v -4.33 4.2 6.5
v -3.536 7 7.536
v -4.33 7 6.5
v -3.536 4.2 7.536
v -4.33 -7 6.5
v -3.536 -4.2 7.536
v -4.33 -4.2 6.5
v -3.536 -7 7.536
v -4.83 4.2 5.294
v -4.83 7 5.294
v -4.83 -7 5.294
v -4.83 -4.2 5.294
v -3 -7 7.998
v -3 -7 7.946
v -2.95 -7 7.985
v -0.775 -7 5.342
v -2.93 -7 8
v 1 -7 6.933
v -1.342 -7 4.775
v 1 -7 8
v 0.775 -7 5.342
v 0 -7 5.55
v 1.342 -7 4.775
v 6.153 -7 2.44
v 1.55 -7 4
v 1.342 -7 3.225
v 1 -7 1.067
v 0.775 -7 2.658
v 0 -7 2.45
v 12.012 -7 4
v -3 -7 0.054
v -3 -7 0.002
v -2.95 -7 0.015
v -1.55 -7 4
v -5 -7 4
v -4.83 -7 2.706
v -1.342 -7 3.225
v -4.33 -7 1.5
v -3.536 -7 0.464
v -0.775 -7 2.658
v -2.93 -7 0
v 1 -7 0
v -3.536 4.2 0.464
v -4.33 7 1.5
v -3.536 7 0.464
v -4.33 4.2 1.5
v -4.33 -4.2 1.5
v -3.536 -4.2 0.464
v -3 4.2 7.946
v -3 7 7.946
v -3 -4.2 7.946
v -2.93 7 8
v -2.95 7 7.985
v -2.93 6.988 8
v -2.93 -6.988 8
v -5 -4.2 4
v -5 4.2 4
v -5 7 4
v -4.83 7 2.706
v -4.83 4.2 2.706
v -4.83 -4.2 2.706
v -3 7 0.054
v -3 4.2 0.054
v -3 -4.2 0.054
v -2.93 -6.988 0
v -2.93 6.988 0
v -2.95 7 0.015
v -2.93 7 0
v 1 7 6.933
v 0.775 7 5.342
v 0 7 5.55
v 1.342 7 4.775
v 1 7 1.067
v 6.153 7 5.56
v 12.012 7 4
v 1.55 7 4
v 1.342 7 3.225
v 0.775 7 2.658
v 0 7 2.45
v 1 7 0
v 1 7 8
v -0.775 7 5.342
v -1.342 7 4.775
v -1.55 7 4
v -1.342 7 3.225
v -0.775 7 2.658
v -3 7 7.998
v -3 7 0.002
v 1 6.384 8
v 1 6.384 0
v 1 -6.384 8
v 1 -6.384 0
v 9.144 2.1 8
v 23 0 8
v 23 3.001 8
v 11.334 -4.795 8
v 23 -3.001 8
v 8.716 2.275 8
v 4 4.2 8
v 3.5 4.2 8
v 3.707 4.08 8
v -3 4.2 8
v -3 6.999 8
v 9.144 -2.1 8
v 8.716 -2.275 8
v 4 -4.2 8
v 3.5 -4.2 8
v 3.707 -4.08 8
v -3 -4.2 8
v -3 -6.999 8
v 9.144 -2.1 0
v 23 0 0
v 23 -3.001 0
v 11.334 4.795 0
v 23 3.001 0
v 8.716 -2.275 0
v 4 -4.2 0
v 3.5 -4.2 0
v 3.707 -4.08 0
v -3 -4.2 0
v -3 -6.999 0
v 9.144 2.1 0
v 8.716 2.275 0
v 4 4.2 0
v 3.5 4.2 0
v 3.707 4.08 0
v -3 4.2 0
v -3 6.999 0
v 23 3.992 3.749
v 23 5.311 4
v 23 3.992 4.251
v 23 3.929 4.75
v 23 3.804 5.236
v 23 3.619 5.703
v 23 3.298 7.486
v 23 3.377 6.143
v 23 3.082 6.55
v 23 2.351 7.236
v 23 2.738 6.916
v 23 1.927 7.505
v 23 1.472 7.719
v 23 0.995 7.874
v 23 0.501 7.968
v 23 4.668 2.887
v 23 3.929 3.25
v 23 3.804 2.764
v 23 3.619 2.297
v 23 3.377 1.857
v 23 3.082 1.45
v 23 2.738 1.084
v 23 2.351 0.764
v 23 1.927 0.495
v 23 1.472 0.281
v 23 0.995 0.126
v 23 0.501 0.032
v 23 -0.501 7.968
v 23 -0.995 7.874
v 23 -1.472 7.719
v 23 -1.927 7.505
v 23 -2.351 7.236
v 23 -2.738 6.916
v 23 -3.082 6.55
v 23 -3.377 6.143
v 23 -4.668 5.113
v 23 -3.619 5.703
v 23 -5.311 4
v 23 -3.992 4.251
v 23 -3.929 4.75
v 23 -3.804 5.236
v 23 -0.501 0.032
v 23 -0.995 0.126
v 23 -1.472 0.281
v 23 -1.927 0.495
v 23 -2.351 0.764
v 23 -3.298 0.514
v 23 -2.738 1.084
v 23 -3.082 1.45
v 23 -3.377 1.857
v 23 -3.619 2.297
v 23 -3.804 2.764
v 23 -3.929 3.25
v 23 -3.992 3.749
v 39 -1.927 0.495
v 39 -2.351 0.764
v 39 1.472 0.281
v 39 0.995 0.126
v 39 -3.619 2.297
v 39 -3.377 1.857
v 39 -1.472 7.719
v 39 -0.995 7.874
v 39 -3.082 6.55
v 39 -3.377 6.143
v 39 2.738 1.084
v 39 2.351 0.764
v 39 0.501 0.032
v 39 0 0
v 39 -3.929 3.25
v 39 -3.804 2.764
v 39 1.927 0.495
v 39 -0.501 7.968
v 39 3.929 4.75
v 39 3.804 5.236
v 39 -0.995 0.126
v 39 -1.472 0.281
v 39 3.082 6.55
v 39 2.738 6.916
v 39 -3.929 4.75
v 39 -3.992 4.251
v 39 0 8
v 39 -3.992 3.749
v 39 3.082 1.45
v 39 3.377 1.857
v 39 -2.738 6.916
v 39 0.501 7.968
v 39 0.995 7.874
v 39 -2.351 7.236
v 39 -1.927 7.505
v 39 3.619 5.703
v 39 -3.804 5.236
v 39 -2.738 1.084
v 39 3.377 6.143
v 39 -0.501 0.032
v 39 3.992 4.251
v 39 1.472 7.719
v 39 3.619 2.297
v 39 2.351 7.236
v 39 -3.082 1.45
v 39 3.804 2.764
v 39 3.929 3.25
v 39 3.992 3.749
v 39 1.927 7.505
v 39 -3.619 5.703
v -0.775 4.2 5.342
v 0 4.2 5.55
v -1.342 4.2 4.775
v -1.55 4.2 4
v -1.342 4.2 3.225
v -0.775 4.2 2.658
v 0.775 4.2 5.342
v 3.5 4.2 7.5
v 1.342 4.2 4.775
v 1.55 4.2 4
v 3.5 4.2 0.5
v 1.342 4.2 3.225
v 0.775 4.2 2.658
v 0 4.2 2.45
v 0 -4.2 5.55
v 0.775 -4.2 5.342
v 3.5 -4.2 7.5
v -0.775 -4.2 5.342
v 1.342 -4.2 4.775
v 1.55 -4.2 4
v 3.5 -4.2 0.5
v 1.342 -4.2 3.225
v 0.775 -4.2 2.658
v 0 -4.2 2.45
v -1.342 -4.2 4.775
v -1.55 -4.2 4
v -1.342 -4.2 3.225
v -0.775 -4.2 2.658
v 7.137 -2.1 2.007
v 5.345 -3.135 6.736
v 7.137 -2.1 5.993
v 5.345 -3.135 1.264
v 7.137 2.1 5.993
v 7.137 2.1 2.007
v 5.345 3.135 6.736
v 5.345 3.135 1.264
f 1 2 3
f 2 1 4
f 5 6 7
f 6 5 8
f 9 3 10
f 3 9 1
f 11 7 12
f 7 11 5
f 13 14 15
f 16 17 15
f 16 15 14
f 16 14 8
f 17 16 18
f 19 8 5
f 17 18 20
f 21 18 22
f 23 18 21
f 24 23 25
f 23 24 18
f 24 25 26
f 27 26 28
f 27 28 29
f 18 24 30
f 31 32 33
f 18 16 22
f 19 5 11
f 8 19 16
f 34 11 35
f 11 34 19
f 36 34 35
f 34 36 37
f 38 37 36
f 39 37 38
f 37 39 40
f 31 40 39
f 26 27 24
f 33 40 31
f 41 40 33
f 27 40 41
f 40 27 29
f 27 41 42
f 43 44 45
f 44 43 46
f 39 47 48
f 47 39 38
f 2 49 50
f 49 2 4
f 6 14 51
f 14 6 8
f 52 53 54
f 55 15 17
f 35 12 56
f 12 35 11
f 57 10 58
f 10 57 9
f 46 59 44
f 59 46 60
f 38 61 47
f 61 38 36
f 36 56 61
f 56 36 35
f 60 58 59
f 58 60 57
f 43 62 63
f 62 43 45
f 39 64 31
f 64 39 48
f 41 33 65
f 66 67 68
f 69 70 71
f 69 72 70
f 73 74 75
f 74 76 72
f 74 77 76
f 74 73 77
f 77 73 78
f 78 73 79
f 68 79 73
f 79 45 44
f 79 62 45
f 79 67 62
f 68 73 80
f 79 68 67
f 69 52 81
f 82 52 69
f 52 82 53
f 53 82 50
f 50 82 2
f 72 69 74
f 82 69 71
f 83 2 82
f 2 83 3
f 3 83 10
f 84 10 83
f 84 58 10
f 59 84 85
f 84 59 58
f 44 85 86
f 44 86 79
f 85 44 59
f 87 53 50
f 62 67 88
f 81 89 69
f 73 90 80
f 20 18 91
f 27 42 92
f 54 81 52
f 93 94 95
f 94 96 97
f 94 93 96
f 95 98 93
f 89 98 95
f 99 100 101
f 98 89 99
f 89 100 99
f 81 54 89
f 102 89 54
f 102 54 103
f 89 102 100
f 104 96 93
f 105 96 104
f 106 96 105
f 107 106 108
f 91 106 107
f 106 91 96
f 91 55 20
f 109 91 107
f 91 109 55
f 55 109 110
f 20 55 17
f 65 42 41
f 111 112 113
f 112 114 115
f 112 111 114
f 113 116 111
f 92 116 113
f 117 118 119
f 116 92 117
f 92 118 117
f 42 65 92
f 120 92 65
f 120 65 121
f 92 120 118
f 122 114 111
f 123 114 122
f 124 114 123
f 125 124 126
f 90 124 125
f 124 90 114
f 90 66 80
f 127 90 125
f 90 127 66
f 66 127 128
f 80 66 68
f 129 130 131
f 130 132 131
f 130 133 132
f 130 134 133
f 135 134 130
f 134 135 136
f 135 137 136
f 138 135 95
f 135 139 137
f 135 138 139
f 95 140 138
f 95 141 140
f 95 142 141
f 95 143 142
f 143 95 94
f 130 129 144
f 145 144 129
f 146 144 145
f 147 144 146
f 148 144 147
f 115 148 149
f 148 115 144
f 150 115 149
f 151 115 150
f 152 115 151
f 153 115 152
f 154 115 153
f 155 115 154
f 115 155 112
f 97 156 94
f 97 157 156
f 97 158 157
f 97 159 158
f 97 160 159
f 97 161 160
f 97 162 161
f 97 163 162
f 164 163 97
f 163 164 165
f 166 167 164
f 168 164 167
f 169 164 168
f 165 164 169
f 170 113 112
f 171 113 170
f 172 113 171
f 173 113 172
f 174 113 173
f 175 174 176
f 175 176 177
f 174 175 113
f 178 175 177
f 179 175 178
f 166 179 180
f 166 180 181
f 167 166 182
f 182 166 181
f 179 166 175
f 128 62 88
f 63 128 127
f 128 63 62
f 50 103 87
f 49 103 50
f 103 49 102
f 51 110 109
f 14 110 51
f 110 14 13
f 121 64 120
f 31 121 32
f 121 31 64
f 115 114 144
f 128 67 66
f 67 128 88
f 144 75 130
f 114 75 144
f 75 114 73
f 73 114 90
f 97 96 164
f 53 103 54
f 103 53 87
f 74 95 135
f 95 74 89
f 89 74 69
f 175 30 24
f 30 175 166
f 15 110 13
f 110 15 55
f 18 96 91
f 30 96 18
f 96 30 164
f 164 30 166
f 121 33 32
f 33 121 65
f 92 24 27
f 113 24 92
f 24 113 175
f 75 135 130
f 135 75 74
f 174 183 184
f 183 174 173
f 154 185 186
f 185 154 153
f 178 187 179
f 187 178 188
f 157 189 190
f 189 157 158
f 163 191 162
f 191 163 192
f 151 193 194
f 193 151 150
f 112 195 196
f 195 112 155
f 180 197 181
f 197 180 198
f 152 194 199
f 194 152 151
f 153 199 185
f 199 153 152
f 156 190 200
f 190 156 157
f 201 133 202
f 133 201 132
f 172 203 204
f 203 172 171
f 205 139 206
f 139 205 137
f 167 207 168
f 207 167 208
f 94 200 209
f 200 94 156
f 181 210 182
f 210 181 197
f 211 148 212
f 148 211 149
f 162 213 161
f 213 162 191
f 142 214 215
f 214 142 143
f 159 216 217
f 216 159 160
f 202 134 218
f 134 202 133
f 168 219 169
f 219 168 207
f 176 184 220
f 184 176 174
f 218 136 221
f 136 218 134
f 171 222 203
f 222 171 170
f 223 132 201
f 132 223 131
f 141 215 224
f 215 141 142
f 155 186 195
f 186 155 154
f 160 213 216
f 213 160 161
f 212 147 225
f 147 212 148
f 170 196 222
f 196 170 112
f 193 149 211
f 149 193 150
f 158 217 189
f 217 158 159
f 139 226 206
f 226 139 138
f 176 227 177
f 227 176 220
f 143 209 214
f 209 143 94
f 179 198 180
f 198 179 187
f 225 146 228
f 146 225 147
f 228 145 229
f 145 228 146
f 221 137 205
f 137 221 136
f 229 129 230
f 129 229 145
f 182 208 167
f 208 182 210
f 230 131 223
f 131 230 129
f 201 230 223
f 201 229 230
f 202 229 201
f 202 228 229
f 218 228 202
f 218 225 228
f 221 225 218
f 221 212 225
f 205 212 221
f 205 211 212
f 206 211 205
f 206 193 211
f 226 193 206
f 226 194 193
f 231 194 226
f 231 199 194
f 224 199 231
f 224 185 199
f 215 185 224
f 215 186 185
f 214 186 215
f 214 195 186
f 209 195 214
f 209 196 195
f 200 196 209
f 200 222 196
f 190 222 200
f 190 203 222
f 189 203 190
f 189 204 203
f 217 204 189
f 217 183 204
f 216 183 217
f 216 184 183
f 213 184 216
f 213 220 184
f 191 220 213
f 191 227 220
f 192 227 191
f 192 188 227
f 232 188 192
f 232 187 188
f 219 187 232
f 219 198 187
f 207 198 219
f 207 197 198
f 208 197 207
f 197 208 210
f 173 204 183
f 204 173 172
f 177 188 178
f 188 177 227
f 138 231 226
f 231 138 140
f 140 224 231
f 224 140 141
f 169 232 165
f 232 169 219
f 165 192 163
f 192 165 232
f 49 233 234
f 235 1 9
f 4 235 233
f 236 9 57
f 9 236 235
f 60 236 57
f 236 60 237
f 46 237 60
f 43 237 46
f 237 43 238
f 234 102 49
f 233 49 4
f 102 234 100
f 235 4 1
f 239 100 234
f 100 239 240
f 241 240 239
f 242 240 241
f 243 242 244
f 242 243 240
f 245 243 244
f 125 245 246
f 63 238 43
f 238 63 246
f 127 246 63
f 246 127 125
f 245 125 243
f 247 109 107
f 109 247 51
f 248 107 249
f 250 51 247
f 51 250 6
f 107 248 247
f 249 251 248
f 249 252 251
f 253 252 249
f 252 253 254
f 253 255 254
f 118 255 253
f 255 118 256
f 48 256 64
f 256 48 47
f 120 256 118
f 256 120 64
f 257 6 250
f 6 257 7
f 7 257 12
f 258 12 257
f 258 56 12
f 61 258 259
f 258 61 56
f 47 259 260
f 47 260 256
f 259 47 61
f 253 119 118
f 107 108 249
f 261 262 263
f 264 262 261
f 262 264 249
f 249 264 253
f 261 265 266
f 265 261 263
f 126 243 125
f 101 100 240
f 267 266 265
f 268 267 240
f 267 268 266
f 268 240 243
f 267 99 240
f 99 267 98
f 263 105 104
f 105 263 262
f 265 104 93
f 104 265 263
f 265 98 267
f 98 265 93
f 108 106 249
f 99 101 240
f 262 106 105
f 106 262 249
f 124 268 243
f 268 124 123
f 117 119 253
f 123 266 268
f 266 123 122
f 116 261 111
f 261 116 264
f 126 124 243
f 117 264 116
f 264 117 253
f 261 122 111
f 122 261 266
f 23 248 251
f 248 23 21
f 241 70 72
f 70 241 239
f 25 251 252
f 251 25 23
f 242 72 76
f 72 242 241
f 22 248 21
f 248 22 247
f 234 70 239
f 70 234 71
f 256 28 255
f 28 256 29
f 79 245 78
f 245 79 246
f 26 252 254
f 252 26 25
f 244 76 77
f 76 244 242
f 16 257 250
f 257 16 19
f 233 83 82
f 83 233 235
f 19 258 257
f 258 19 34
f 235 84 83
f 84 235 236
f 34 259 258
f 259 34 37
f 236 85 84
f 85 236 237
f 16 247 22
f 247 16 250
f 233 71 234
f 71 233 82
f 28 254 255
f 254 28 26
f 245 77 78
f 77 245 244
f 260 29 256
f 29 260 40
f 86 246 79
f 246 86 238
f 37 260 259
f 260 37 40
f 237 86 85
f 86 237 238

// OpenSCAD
h = 8;
r = h/2 / cos(30);

module jaws() {
  difference() {
    union() {
      intersection () {
        rotate([90, 0, 0]) cylinder(r=5, h=14, center=true, $fn=24);
        translate([-4, 0, 0]) cube([10, 14, h], center=true);
      }
      intersection() {
        translate([10, 0, 0]) cube([26, 14, h], center=true);
        translate([10, 0, 0]) rotate([0, 90, 0]) rotate([0, 0, 30])
          cylinder(r1=10, r2=r, h=35, center=true, $fn=6);
      }
      translate([19, 0, 0]) rotate([0, 90, 0])
      cylinder(r=4, h=40, center=true, $fn=50);
    }
    translate([-1.5, 0, 0]) cube([10, 8.4, 10], center=true);
    translate([3.5, 0, 0]) rotate([0, 0, 30])
      cylinder(r=4.2, h=10, center=true, $fn=6);
    translate([4, 0, 4]) rotate([0, 45, 0])
      rotate([0, 0, 30]) cylinder(r=4.2, h=8, center=true, $fn=6);
    translate([4, 0, -4]) rotate([0, -45, 0])
      rotate([0, 0, 30]) cylinder(r=4.2, h=8, center=true, $fn=6);
    rotate([90, 0, 0]) cylinder(r=1.55, h=40, center=true, $fn=12);
  }
}

translate([0, 0, h/2]) jaws();
